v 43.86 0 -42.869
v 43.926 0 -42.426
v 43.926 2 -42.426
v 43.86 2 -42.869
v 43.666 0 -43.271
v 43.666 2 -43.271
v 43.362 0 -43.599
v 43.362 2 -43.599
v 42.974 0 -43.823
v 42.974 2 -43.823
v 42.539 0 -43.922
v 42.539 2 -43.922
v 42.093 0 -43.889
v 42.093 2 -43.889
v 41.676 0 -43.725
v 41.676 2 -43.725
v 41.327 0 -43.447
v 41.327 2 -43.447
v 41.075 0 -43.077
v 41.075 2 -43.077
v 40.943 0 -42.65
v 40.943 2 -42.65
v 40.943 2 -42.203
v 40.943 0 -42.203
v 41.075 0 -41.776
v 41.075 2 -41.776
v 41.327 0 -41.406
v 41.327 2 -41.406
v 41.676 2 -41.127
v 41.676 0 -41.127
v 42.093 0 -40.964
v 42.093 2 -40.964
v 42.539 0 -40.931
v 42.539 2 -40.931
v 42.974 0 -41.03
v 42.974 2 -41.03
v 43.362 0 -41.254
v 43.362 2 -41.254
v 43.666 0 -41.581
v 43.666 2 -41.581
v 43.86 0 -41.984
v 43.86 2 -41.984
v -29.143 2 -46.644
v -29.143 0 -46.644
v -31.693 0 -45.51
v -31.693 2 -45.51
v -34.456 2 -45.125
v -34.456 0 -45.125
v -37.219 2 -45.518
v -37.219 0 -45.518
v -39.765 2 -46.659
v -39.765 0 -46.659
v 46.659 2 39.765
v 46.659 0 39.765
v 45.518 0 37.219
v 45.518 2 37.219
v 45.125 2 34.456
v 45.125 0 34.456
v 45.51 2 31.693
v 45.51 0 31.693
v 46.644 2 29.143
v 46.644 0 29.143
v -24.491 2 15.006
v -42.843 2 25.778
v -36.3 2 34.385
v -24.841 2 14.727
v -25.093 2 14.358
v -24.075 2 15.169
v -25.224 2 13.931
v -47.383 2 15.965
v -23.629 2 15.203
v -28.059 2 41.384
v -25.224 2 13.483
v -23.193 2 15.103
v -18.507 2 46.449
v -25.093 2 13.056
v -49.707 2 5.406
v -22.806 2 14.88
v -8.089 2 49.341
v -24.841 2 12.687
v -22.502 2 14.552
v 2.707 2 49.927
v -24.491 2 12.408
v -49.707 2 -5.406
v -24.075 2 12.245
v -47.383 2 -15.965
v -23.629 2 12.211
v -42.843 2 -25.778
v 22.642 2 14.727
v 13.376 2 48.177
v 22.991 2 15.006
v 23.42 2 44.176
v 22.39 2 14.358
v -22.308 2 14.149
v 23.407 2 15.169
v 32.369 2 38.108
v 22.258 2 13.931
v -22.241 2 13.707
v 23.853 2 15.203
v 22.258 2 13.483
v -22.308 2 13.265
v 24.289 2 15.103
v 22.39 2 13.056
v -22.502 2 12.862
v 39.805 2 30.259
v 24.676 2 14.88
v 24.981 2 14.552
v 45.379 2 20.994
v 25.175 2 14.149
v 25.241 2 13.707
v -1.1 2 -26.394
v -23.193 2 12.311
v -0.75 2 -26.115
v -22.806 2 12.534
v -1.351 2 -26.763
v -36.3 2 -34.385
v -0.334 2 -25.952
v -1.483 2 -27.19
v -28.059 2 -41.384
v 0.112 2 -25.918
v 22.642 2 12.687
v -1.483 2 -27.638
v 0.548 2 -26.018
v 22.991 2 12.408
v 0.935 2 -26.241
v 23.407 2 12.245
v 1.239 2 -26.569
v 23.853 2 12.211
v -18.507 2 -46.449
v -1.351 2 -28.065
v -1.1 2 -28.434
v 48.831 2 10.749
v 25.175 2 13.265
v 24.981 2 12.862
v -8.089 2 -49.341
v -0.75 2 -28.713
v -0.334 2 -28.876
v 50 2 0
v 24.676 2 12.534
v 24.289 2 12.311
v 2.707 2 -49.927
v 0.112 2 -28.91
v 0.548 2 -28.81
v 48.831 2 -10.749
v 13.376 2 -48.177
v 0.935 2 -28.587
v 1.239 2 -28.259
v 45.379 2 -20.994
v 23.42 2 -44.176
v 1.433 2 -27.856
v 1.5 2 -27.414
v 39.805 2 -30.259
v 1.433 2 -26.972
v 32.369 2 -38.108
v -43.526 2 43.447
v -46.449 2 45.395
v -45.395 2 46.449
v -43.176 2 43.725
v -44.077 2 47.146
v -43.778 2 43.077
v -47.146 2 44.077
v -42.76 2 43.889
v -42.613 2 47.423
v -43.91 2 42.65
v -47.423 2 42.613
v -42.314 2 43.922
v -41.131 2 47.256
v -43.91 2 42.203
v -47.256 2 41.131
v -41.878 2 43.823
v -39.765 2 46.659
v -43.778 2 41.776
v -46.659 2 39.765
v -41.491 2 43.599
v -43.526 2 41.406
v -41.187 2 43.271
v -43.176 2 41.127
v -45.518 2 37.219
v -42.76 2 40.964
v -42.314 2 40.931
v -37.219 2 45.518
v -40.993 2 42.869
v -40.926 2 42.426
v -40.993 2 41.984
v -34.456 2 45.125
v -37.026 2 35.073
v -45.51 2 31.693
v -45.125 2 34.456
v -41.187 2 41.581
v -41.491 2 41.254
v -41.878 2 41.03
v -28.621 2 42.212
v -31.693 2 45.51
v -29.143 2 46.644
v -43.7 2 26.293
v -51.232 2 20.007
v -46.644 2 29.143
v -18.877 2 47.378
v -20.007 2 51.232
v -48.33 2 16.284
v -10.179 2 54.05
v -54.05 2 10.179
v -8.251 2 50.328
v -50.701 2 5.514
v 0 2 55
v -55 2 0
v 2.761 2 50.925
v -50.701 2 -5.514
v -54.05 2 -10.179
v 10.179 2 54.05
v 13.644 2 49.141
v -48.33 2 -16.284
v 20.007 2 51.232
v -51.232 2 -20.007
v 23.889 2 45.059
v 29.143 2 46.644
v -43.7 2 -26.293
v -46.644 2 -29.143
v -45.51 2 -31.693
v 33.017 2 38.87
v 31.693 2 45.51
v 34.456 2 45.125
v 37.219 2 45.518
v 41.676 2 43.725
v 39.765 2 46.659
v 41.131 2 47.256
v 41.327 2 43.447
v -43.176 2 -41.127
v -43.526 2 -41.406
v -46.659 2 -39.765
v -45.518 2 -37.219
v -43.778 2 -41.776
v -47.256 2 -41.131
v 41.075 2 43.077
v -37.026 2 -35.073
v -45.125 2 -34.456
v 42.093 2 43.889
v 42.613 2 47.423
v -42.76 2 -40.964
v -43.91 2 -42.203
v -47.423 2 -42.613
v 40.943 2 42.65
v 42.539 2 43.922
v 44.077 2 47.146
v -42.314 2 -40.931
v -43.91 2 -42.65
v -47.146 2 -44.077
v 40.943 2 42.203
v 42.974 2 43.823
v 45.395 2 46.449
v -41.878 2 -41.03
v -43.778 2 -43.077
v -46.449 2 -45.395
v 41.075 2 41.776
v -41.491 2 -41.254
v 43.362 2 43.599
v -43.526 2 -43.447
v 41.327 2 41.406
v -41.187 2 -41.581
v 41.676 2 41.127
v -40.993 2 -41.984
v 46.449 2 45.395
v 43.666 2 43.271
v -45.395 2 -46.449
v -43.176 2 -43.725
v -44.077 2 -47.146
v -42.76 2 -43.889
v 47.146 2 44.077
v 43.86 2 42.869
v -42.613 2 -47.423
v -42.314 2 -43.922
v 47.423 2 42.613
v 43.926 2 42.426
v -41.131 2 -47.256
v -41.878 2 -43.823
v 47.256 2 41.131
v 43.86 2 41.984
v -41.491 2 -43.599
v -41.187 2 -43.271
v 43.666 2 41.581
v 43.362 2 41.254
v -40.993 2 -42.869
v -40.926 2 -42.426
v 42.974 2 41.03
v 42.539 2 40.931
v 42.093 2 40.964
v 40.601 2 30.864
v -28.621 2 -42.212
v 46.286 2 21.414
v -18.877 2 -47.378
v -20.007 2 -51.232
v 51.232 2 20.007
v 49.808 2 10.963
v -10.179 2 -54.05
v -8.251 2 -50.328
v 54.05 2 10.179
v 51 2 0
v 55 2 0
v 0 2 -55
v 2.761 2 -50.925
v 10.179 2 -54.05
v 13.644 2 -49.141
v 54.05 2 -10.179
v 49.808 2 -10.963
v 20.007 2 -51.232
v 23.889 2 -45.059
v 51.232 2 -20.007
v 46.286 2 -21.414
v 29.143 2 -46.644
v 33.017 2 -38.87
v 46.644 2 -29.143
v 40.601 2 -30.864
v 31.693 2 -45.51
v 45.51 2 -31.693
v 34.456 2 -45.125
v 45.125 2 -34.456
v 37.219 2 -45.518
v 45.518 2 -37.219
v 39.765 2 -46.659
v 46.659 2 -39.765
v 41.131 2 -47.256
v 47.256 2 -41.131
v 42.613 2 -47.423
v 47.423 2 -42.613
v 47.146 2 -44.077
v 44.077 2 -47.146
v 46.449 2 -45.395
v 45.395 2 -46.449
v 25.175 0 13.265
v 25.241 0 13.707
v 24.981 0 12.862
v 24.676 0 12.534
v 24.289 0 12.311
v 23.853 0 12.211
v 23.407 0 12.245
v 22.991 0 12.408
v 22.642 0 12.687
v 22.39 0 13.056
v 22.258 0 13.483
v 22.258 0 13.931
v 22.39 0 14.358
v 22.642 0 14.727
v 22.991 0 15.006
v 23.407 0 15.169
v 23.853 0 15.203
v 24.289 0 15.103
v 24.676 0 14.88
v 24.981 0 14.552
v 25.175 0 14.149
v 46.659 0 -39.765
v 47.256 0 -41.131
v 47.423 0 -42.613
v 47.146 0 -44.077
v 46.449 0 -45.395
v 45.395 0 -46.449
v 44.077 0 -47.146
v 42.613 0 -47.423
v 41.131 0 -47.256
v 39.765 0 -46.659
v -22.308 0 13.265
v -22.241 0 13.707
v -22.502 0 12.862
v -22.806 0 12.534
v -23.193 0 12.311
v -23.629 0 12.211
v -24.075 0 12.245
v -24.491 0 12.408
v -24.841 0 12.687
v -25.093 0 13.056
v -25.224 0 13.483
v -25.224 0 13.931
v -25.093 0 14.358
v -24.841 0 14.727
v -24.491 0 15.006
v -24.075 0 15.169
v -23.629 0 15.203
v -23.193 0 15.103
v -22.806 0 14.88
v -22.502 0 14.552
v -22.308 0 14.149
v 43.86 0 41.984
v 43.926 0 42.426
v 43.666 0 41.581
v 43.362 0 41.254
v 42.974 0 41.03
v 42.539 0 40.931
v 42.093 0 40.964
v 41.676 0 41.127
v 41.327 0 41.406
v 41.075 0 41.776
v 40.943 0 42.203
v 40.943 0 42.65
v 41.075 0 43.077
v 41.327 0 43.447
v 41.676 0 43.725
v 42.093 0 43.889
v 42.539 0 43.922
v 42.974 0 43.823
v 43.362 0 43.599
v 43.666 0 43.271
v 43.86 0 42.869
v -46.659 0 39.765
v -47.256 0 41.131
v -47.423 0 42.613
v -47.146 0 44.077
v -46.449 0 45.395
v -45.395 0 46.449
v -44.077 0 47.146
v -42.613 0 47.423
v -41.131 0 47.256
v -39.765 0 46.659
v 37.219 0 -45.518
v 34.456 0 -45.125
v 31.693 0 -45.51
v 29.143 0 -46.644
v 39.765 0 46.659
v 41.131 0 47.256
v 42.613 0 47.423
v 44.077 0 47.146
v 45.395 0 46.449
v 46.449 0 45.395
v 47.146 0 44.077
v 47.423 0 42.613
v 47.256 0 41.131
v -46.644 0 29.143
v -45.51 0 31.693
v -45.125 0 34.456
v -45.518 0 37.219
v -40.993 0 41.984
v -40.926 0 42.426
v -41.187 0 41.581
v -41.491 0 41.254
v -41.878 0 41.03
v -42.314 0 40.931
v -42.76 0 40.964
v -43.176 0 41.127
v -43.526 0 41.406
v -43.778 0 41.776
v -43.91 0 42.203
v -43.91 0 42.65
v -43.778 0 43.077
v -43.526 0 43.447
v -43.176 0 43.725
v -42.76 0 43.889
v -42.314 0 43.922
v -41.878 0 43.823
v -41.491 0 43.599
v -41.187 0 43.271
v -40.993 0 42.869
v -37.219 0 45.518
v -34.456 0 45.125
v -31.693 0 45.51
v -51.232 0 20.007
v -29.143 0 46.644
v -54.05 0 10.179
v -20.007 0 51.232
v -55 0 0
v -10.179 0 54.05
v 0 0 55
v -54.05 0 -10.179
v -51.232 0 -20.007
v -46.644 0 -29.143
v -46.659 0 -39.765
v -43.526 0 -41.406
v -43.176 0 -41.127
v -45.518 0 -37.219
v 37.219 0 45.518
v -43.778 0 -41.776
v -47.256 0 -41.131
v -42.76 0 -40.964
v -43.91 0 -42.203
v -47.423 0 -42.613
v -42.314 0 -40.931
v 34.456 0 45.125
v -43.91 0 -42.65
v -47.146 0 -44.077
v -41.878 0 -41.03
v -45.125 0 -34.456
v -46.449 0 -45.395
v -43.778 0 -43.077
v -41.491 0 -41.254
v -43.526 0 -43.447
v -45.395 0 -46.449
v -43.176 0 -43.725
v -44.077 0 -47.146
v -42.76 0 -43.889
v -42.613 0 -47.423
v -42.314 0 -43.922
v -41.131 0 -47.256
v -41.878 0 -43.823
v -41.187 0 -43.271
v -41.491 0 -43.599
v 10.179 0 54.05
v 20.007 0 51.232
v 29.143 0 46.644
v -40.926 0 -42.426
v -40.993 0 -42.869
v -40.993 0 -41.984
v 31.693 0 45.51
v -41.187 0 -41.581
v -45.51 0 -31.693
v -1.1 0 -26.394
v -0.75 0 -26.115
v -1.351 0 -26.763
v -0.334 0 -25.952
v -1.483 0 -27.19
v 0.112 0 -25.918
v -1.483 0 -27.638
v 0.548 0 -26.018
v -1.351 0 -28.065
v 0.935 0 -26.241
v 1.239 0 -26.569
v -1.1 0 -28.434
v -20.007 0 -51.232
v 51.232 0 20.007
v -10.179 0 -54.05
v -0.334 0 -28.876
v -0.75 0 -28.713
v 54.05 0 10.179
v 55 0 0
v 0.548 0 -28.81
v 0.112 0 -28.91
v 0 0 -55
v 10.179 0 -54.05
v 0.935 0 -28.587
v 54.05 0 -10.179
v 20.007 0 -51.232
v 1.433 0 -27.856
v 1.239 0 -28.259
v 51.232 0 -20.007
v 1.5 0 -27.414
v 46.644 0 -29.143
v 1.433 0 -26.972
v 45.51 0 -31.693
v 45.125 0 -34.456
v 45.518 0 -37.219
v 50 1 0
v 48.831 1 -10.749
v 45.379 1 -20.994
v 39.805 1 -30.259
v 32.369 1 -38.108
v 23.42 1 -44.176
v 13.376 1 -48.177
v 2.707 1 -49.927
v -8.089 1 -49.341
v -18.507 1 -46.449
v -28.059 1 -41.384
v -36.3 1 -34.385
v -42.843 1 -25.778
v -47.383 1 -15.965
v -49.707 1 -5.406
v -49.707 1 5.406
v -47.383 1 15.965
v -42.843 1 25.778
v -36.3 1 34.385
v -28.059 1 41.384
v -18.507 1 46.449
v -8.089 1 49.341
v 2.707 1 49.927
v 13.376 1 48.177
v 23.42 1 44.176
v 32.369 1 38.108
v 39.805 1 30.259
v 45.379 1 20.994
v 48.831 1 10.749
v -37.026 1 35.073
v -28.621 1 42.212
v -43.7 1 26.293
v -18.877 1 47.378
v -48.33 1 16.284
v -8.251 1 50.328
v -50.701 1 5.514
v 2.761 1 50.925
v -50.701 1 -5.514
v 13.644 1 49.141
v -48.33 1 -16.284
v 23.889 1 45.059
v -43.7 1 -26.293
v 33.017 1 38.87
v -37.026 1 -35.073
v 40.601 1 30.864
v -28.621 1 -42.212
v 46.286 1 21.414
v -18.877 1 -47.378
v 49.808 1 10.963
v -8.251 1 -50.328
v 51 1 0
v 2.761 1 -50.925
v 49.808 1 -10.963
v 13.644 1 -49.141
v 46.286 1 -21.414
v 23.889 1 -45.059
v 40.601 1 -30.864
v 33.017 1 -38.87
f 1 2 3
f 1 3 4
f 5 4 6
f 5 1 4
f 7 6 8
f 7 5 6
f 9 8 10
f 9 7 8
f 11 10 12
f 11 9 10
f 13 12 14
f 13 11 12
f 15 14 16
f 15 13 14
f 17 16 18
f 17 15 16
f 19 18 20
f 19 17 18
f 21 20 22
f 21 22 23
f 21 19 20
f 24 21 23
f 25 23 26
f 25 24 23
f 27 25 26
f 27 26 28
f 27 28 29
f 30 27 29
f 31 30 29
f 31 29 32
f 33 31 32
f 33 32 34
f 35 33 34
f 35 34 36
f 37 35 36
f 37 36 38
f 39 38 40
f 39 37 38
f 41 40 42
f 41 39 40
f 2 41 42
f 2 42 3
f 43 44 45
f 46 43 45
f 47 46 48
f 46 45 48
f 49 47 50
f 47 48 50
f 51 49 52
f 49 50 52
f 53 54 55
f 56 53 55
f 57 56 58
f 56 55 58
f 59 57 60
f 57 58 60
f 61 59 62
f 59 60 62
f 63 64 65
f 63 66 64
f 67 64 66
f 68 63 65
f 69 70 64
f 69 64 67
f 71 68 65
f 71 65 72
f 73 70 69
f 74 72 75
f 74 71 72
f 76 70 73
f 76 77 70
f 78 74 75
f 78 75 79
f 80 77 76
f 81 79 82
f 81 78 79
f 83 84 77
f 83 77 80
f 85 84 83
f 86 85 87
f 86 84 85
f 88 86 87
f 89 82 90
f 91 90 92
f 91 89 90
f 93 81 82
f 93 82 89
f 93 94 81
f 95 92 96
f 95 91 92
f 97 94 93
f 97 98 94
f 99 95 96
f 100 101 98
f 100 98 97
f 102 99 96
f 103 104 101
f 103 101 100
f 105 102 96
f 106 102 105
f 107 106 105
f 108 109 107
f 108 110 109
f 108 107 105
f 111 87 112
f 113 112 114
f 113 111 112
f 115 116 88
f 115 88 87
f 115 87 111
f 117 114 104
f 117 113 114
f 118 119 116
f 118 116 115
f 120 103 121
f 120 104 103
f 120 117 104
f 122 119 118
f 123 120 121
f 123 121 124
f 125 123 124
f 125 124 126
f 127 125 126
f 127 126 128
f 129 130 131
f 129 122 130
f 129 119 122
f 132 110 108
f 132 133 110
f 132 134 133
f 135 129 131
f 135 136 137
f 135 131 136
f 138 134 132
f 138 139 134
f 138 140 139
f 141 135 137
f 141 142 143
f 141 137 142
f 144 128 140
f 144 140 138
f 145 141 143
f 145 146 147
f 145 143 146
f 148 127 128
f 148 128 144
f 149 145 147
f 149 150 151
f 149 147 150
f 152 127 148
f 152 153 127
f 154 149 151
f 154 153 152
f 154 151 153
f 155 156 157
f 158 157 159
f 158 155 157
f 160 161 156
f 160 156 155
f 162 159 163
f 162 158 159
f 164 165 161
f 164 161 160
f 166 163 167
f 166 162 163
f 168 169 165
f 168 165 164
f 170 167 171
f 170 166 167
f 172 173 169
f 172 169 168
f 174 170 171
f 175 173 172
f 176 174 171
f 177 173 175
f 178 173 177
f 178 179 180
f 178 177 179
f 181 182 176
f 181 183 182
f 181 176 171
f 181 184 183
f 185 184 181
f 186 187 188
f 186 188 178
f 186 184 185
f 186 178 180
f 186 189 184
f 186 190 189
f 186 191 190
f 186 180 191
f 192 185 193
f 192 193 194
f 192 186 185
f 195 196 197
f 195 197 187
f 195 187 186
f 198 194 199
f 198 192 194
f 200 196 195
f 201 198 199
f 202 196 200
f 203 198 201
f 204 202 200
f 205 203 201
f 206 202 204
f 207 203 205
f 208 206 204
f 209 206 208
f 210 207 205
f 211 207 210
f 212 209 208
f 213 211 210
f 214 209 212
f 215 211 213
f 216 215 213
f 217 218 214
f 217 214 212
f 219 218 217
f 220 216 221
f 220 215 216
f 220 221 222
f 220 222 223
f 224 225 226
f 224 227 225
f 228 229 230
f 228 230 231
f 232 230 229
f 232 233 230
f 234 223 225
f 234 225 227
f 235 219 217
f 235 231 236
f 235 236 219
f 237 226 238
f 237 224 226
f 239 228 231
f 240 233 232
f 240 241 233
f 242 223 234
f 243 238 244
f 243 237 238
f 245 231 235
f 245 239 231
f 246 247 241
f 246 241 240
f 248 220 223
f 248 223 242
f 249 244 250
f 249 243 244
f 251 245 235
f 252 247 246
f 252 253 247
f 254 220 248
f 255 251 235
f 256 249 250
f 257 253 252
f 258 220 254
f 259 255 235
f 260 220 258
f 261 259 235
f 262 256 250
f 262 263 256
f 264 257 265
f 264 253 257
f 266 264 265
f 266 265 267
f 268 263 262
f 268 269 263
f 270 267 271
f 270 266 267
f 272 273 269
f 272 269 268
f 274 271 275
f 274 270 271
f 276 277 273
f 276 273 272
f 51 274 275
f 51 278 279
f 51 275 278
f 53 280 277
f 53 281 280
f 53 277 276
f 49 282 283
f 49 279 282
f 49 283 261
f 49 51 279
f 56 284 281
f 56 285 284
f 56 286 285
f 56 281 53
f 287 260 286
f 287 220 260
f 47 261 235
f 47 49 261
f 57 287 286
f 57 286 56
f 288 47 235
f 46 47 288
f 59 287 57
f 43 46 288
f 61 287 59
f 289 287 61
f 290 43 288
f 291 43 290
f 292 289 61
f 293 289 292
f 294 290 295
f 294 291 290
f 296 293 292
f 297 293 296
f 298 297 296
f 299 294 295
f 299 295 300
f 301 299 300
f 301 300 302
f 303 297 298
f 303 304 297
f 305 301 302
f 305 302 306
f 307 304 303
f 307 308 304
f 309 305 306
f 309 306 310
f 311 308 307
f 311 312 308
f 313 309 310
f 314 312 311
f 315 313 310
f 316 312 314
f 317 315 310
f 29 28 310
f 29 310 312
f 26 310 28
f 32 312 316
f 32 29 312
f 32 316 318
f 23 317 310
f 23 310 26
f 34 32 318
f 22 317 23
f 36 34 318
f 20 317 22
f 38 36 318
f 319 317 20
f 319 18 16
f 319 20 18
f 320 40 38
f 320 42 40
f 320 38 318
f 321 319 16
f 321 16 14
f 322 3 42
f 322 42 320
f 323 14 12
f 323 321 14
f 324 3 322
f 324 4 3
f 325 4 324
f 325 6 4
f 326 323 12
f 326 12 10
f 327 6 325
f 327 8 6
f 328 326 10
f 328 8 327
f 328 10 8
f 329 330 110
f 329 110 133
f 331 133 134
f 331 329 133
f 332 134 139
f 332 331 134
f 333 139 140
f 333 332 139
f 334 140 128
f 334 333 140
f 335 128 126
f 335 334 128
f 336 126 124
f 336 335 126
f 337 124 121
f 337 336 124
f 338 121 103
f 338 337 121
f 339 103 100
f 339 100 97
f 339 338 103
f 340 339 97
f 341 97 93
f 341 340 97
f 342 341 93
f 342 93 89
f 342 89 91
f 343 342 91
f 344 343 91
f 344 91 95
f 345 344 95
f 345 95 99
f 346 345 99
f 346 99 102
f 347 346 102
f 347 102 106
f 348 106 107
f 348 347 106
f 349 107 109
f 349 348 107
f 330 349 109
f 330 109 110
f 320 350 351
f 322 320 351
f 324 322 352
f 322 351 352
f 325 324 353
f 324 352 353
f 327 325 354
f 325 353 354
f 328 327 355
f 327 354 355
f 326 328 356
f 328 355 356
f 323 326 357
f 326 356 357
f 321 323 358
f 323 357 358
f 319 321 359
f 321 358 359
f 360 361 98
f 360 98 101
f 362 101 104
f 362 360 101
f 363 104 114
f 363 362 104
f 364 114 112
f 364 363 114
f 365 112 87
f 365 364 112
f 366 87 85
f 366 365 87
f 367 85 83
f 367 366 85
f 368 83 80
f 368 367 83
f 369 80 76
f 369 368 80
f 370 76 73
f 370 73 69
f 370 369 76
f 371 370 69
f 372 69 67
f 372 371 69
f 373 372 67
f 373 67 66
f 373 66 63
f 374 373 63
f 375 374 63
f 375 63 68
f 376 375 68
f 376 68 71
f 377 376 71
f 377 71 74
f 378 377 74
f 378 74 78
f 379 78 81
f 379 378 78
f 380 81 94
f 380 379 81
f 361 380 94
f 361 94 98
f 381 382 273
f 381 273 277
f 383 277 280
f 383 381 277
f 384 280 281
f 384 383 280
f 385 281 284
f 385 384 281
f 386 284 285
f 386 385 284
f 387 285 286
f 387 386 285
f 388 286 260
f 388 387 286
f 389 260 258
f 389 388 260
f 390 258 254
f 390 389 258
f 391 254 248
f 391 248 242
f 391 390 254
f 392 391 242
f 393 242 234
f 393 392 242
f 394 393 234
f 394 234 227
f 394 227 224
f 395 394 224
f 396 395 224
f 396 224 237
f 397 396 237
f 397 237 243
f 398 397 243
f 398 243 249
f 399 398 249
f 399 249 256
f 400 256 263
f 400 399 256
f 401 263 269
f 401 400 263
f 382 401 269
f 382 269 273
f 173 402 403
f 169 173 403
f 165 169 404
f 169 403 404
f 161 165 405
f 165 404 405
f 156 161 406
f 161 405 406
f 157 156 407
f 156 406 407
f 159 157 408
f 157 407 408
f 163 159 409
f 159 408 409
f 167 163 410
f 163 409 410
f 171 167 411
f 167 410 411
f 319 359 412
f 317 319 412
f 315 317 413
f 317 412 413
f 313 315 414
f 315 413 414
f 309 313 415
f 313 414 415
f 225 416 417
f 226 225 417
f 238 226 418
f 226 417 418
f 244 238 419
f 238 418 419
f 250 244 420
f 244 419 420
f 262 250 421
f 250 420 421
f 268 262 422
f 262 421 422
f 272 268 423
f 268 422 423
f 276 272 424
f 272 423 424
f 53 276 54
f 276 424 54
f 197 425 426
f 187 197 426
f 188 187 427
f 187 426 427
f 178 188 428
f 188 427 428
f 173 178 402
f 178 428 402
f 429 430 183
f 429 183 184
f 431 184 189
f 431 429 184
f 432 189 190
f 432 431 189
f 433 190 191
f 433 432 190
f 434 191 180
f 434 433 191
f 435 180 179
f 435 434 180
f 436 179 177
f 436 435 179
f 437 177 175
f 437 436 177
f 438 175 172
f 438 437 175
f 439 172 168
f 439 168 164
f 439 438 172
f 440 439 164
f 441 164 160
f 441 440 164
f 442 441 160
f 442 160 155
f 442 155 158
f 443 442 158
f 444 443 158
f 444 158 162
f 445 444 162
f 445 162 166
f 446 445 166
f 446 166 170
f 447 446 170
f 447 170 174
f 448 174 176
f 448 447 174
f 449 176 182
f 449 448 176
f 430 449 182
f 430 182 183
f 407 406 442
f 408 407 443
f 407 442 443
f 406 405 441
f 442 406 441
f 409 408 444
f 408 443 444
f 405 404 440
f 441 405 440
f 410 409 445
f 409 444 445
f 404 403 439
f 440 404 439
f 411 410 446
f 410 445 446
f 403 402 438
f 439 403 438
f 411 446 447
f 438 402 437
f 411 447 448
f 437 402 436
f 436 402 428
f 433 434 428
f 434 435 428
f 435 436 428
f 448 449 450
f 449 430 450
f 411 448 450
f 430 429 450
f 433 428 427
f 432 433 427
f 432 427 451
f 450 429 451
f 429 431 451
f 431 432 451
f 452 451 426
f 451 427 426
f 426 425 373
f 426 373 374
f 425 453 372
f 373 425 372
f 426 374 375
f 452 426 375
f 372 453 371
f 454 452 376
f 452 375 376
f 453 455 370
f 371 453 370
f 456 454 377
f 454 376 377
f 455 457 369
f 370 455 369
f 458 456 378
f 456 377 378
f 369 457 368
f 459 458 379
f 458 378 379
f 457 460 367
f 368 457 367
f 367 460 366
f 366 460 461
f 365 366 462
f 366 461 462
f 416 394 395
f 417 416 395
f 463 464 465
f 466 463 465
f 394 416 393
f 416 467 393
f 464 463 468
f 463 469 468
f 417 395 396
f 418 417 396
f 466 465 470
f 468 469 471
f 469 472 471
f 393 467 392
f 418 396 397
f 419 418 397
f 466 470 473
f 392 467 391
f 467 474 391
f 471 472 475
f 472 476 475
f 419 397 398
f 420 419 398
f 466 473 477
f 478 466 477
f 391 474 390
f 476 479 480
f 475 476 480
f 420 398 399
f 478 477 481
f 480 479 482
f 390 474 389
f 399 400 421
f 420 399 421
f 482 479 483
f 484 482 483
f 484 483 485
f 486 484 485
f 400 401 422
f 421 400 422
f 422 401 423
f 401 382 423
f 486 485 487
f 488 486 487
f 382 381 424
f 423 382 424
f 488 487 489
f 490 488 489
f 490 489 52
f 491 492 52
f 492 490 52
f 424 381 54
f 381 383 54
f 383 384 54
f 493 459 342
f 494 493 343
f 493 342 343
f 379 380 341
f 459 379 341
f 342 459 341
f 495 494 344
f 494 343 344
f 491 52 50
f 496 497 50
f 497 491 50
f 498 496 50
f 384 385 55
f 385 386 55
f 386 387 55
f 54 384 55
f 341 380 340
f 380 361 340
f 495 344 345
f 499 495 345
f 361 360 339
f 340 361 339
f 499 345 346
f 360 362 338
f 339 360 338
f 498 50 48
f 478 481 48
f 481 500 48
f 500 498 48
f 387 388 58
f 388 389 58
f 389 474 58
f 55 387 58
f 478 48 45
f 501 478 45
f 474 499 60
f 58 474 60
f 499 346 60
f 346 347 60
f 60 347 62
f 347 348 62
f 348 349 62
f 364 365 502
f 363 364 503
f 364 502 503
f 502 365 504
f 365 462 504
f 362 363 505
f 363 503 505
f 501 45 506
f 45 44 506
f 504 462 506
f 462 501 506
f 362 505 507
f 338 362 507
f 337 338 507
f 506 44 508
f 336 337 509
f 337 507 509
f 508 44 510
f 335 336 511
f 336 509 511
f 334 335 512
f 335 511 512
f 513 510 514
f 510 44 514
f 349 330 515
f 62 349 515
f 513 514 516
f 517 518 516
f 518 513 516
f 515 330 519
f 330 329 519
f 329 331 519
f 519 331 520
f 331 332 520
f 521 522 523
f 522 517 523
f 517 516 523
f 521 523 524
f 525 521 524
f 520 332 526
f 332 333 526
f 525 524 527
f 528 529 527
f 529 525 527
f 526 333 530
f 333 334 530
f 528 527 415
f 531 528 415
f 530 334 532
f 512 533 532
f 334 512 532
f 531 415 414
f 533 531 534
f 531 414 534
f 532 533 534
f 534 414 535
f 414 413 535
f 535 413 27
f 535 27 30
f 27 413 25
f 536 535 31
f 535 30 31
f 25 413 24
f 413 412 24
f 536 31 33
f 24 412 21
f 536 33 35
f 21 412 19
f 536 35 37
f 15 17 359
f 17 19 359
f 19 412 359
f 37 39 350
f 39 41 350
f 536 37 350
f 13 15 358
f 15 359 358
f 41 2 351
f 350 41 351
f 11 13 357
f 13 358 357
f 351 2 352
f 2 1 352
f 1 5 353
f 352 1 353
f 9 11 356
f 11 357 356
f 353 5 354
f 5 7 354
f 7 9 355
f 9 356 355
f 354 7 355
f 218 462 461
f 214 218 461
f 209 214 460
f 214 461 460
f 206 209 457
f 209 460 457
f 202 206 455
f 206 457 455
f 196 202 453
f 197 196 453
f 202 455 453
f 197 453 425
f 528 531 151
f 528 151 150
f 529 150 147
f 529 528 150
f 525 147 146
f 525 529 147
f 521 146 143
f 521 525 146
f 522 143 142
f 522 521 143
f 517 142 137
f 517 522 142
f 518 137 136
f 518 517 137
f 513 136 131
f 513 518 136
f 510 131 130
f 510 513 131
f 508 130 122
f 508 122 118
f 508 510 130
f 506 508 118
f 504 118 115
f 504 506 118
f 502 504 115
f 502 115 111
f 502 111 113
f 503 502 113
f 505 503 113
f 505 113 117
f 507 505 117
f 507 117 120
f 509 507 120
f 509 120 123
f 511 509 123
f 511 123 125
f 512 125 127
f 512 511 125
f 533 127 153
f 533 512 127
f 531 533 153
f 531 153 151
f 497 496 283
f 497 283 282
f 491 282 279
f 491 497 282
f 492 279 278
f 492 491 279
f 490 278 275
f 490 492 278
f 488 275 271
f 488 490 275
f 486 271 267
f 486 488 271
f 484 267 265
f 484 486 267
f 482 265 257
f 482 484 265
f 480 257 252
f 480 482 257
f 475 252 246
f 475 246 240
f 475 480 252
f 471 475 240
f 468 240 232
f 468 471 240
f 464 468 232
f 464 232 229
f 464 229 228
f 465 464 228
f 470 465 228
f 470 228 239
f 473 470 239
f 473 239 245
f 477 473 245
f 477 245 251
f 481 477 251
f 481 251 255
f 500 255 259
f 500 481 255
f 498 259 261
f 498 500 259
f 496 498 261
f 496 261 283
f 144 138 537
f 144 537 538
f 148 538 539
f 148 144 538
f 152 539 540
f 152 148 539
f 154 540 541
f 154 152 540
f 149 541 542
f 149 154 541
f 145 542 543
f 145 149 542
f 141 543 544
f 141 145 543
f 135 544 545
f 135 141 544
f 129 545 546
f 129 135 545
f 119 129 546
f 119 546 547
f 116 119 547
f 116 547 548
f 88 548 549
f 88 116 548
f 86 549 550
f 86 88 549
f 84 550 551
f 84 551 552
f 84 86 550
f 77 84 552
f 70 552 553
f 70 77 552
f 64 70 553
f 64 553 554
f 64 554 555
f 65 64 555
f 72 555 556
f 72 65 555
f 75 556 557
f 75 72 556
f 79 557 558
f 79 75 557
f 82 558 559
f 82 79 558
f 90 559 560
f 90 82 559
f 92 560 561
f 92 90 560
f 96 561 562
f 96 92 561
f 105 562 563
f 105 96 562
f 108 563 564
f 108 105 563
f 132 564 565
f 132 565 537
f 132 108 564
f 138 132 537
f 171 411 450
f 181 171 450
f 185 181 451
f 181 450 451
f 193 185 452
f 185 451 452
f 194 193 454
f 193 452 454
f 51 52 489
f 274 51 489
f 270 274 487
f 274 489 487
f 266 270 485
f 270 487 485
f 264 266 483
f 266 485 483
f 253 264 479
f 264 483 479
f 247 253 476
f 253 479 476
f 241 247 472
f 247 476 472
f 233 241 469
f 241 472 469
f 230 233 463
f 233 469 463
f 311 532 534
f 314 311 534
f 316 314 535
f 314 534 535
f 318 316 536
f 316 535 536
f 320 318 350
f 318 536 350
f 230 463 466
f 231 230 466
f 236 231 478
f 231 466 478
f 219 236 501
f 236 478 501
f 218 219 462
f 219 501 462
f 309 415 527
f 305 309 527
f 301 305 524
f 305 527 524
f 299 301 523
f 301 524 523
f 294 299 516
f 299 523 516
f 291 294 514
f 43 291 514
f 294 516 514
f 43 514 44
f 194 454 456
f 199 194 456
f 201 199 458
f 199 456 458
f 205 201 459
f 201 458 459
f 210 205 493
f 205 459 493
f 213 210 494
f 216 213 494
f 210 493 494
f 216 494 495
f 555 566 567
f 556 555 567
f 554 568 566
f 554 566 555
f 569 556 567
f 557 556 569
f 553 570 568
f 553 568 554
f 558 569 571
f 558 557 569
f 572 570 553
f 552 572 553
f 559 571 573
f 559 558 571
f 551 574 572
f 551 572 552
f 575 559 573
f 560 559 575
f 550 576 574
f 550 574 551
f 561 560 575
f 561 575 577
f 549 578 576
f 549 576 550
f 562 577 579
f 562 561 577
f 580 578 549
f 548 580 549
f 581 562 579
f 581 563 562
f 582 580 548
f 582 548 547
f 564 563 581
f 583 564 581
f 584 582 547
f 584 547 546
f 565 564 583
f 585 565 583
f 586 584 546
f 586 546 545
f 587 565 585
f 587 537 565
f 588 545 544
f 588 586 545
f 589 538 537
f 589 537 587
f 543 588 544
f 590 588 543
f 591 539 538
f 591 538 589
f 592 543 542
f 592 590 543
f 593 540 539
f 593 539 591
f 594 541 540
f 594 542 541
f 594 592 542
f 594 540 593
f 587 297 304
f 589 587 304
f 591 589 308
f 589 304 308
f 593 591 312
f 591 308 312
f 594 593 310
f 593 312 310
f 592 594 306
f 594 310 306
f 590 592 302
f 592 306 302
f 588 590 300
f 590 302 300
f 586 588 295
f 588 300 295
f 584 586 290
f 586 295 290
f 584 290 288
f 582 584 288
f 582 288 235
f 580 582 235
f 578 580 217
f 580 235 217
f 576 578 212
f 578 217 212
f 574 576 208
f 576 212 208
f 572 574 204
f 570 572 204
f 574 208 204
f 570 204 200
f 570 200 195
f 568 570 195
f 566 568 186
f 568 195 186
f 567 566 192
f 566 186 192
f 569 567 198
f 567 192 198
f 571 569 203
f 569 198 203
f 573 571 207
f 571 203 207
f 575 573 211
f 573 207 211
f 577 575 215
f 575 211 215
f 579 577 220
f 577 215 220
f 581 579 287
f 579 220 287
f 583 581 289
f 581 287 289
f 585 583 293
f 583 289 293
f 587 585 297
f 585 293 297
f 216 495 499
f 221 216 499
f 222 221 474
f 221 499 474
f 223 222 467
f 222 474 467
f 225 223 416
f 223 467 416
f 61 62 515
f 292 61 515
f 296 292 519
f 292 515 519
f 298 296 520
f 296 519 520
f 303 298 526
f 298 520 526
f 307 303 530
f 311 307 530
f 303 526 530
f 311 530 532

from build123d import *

# Parameters (mm, degrees)
SKETCH2_R           = 1.5
BOSS_EXTRUDE1_DEPTH = 2
SKETCH3_R           = 51
SKETCH3_R_2         = 50
CUT_EXTRUDE1_DEPTH  = 1


with BuildPart() as part:
    # Sketch2 → Boss-Extrude1 (new body)
    with BuildSketch(Plane(origin=(0, 0, 0), x_dir=(1, 0, 0), z_dir=(0, 1, 0))):
        with BuildLine():
            ThreePointArc((-46.644081999, 29.14326019), (-55, 0), (-46.644081999, -29.14326019))
            ThreePointArc((-46.644081999, -29.14326019), (-45.124834326, -34.456279799), (-46.659212641, -39.764949504))
            ThreePointArc((-46.659212641, -39.764949504), (-45.961940777, -45.961940777), (-39.764949504, -46.659212641))
            ThreePointArc((-39.764949504, -46.659212641), (-34.456279799, -45.124834326), (-29.14326019, -46.644081999))
            ThreePointArc((-29.14326019, -46.644081999), (0, -55), (29.14326019, -46.644081999))
            ThreePointArc((29.14326019, -46.644081999), (34.456279799, -45.124834326), (39.764949504, -46.659212641))
            ThreePointArc((39.764949504, -46.659212641), (45.961940777, -45.961940777), (46.659212641, -39.764949504))
            ThreePointArc((46.659212641, -39.764949504), (45.124834326, -34.456279799), (46.644081999, -29.14326019))
            ThreePointArc((46.644081999, -29.14326019), (55, 0), (46.644081999, 29.14326019))
            ThreePointArc((46.644081999, 29.14326019), (45.124834326, 34.456279799), (46.659212641, 39.764949504))
            ThreePointArc((46.659212641, 39.764949504), (45.961940777, 45.961940777), (39.764949504, 46.659212641))
            ThreePointArc((39.764949504, 46.659212641), (34.456279799, 45.124834326), (29.14326019, 46.644081999))
            ThreePointArc((29.14326019, 46.644081999), (0, 55), (-29.14326019, 46.644081999))
            ThreePointArc((-29.14326019, 46.644081999), (-34.456279799, 45.124834326), (-39.764949504, 46.659212641))
            ThreePointArc((-39.764949504, 46.659212641), (-45.961940777, 45.961940777), (-46.659212641, 39.764949504))
            ThreePointArc((-46.659212641, 39.764949504), (-45.124834326, 34.456279799), (-46.644081999, 29.14326019))
        make_face()
        with Locations((-42.426406871, 42.426406871)):
            Circle(SKETCH2_R, mode=Mode.SUBTRACT)
        with Locations((-23.741169162, -13.706970407)):
            Circle(SKETCH2_R, mode=Mode.SUBTRACT)
        with Locations((23.741169162, -13.706970407)):
            Circle(SKETCH2_R, mode=Mode.SUBTRACT)
        with Locations((0, 27.413940814)):
            Circle(SKETCH2_R, mode=Mode.SUBTRACT)
        with Locations((42.426406871, 42.426406871)):
            Circle(SKETCH2_R, mode=Mode.SUBTRACT)
        with Locations((42.426406871, -42.426406871)):
            Circle(SKETCH2_R, mode=Mode.SUBTRACT)
        with Locations((-42.426406871, -42.426406871)):
            Circle(SKETCH2_R, mode=Mode.SUBTRACT)
    extrude(amount=BOSS_EXTRUDE1_DEPTH)

    # Sketch3 → Cut-Extrude1 (cut)
    with BuildSketch(Plane(origin=(0, 2, 0), x_dir=(1, 0, 0), z_dir=(0, 1, 0))):
        Circle(SKETCH3_R)
        Circle(SKETCH3_R_2, mode=Mode.SUBTRACT)
    extrude(amount=-CUT_EXTRUDE1_DEPTH, mode=Mode.SUBTRACT)


solid = part.part
